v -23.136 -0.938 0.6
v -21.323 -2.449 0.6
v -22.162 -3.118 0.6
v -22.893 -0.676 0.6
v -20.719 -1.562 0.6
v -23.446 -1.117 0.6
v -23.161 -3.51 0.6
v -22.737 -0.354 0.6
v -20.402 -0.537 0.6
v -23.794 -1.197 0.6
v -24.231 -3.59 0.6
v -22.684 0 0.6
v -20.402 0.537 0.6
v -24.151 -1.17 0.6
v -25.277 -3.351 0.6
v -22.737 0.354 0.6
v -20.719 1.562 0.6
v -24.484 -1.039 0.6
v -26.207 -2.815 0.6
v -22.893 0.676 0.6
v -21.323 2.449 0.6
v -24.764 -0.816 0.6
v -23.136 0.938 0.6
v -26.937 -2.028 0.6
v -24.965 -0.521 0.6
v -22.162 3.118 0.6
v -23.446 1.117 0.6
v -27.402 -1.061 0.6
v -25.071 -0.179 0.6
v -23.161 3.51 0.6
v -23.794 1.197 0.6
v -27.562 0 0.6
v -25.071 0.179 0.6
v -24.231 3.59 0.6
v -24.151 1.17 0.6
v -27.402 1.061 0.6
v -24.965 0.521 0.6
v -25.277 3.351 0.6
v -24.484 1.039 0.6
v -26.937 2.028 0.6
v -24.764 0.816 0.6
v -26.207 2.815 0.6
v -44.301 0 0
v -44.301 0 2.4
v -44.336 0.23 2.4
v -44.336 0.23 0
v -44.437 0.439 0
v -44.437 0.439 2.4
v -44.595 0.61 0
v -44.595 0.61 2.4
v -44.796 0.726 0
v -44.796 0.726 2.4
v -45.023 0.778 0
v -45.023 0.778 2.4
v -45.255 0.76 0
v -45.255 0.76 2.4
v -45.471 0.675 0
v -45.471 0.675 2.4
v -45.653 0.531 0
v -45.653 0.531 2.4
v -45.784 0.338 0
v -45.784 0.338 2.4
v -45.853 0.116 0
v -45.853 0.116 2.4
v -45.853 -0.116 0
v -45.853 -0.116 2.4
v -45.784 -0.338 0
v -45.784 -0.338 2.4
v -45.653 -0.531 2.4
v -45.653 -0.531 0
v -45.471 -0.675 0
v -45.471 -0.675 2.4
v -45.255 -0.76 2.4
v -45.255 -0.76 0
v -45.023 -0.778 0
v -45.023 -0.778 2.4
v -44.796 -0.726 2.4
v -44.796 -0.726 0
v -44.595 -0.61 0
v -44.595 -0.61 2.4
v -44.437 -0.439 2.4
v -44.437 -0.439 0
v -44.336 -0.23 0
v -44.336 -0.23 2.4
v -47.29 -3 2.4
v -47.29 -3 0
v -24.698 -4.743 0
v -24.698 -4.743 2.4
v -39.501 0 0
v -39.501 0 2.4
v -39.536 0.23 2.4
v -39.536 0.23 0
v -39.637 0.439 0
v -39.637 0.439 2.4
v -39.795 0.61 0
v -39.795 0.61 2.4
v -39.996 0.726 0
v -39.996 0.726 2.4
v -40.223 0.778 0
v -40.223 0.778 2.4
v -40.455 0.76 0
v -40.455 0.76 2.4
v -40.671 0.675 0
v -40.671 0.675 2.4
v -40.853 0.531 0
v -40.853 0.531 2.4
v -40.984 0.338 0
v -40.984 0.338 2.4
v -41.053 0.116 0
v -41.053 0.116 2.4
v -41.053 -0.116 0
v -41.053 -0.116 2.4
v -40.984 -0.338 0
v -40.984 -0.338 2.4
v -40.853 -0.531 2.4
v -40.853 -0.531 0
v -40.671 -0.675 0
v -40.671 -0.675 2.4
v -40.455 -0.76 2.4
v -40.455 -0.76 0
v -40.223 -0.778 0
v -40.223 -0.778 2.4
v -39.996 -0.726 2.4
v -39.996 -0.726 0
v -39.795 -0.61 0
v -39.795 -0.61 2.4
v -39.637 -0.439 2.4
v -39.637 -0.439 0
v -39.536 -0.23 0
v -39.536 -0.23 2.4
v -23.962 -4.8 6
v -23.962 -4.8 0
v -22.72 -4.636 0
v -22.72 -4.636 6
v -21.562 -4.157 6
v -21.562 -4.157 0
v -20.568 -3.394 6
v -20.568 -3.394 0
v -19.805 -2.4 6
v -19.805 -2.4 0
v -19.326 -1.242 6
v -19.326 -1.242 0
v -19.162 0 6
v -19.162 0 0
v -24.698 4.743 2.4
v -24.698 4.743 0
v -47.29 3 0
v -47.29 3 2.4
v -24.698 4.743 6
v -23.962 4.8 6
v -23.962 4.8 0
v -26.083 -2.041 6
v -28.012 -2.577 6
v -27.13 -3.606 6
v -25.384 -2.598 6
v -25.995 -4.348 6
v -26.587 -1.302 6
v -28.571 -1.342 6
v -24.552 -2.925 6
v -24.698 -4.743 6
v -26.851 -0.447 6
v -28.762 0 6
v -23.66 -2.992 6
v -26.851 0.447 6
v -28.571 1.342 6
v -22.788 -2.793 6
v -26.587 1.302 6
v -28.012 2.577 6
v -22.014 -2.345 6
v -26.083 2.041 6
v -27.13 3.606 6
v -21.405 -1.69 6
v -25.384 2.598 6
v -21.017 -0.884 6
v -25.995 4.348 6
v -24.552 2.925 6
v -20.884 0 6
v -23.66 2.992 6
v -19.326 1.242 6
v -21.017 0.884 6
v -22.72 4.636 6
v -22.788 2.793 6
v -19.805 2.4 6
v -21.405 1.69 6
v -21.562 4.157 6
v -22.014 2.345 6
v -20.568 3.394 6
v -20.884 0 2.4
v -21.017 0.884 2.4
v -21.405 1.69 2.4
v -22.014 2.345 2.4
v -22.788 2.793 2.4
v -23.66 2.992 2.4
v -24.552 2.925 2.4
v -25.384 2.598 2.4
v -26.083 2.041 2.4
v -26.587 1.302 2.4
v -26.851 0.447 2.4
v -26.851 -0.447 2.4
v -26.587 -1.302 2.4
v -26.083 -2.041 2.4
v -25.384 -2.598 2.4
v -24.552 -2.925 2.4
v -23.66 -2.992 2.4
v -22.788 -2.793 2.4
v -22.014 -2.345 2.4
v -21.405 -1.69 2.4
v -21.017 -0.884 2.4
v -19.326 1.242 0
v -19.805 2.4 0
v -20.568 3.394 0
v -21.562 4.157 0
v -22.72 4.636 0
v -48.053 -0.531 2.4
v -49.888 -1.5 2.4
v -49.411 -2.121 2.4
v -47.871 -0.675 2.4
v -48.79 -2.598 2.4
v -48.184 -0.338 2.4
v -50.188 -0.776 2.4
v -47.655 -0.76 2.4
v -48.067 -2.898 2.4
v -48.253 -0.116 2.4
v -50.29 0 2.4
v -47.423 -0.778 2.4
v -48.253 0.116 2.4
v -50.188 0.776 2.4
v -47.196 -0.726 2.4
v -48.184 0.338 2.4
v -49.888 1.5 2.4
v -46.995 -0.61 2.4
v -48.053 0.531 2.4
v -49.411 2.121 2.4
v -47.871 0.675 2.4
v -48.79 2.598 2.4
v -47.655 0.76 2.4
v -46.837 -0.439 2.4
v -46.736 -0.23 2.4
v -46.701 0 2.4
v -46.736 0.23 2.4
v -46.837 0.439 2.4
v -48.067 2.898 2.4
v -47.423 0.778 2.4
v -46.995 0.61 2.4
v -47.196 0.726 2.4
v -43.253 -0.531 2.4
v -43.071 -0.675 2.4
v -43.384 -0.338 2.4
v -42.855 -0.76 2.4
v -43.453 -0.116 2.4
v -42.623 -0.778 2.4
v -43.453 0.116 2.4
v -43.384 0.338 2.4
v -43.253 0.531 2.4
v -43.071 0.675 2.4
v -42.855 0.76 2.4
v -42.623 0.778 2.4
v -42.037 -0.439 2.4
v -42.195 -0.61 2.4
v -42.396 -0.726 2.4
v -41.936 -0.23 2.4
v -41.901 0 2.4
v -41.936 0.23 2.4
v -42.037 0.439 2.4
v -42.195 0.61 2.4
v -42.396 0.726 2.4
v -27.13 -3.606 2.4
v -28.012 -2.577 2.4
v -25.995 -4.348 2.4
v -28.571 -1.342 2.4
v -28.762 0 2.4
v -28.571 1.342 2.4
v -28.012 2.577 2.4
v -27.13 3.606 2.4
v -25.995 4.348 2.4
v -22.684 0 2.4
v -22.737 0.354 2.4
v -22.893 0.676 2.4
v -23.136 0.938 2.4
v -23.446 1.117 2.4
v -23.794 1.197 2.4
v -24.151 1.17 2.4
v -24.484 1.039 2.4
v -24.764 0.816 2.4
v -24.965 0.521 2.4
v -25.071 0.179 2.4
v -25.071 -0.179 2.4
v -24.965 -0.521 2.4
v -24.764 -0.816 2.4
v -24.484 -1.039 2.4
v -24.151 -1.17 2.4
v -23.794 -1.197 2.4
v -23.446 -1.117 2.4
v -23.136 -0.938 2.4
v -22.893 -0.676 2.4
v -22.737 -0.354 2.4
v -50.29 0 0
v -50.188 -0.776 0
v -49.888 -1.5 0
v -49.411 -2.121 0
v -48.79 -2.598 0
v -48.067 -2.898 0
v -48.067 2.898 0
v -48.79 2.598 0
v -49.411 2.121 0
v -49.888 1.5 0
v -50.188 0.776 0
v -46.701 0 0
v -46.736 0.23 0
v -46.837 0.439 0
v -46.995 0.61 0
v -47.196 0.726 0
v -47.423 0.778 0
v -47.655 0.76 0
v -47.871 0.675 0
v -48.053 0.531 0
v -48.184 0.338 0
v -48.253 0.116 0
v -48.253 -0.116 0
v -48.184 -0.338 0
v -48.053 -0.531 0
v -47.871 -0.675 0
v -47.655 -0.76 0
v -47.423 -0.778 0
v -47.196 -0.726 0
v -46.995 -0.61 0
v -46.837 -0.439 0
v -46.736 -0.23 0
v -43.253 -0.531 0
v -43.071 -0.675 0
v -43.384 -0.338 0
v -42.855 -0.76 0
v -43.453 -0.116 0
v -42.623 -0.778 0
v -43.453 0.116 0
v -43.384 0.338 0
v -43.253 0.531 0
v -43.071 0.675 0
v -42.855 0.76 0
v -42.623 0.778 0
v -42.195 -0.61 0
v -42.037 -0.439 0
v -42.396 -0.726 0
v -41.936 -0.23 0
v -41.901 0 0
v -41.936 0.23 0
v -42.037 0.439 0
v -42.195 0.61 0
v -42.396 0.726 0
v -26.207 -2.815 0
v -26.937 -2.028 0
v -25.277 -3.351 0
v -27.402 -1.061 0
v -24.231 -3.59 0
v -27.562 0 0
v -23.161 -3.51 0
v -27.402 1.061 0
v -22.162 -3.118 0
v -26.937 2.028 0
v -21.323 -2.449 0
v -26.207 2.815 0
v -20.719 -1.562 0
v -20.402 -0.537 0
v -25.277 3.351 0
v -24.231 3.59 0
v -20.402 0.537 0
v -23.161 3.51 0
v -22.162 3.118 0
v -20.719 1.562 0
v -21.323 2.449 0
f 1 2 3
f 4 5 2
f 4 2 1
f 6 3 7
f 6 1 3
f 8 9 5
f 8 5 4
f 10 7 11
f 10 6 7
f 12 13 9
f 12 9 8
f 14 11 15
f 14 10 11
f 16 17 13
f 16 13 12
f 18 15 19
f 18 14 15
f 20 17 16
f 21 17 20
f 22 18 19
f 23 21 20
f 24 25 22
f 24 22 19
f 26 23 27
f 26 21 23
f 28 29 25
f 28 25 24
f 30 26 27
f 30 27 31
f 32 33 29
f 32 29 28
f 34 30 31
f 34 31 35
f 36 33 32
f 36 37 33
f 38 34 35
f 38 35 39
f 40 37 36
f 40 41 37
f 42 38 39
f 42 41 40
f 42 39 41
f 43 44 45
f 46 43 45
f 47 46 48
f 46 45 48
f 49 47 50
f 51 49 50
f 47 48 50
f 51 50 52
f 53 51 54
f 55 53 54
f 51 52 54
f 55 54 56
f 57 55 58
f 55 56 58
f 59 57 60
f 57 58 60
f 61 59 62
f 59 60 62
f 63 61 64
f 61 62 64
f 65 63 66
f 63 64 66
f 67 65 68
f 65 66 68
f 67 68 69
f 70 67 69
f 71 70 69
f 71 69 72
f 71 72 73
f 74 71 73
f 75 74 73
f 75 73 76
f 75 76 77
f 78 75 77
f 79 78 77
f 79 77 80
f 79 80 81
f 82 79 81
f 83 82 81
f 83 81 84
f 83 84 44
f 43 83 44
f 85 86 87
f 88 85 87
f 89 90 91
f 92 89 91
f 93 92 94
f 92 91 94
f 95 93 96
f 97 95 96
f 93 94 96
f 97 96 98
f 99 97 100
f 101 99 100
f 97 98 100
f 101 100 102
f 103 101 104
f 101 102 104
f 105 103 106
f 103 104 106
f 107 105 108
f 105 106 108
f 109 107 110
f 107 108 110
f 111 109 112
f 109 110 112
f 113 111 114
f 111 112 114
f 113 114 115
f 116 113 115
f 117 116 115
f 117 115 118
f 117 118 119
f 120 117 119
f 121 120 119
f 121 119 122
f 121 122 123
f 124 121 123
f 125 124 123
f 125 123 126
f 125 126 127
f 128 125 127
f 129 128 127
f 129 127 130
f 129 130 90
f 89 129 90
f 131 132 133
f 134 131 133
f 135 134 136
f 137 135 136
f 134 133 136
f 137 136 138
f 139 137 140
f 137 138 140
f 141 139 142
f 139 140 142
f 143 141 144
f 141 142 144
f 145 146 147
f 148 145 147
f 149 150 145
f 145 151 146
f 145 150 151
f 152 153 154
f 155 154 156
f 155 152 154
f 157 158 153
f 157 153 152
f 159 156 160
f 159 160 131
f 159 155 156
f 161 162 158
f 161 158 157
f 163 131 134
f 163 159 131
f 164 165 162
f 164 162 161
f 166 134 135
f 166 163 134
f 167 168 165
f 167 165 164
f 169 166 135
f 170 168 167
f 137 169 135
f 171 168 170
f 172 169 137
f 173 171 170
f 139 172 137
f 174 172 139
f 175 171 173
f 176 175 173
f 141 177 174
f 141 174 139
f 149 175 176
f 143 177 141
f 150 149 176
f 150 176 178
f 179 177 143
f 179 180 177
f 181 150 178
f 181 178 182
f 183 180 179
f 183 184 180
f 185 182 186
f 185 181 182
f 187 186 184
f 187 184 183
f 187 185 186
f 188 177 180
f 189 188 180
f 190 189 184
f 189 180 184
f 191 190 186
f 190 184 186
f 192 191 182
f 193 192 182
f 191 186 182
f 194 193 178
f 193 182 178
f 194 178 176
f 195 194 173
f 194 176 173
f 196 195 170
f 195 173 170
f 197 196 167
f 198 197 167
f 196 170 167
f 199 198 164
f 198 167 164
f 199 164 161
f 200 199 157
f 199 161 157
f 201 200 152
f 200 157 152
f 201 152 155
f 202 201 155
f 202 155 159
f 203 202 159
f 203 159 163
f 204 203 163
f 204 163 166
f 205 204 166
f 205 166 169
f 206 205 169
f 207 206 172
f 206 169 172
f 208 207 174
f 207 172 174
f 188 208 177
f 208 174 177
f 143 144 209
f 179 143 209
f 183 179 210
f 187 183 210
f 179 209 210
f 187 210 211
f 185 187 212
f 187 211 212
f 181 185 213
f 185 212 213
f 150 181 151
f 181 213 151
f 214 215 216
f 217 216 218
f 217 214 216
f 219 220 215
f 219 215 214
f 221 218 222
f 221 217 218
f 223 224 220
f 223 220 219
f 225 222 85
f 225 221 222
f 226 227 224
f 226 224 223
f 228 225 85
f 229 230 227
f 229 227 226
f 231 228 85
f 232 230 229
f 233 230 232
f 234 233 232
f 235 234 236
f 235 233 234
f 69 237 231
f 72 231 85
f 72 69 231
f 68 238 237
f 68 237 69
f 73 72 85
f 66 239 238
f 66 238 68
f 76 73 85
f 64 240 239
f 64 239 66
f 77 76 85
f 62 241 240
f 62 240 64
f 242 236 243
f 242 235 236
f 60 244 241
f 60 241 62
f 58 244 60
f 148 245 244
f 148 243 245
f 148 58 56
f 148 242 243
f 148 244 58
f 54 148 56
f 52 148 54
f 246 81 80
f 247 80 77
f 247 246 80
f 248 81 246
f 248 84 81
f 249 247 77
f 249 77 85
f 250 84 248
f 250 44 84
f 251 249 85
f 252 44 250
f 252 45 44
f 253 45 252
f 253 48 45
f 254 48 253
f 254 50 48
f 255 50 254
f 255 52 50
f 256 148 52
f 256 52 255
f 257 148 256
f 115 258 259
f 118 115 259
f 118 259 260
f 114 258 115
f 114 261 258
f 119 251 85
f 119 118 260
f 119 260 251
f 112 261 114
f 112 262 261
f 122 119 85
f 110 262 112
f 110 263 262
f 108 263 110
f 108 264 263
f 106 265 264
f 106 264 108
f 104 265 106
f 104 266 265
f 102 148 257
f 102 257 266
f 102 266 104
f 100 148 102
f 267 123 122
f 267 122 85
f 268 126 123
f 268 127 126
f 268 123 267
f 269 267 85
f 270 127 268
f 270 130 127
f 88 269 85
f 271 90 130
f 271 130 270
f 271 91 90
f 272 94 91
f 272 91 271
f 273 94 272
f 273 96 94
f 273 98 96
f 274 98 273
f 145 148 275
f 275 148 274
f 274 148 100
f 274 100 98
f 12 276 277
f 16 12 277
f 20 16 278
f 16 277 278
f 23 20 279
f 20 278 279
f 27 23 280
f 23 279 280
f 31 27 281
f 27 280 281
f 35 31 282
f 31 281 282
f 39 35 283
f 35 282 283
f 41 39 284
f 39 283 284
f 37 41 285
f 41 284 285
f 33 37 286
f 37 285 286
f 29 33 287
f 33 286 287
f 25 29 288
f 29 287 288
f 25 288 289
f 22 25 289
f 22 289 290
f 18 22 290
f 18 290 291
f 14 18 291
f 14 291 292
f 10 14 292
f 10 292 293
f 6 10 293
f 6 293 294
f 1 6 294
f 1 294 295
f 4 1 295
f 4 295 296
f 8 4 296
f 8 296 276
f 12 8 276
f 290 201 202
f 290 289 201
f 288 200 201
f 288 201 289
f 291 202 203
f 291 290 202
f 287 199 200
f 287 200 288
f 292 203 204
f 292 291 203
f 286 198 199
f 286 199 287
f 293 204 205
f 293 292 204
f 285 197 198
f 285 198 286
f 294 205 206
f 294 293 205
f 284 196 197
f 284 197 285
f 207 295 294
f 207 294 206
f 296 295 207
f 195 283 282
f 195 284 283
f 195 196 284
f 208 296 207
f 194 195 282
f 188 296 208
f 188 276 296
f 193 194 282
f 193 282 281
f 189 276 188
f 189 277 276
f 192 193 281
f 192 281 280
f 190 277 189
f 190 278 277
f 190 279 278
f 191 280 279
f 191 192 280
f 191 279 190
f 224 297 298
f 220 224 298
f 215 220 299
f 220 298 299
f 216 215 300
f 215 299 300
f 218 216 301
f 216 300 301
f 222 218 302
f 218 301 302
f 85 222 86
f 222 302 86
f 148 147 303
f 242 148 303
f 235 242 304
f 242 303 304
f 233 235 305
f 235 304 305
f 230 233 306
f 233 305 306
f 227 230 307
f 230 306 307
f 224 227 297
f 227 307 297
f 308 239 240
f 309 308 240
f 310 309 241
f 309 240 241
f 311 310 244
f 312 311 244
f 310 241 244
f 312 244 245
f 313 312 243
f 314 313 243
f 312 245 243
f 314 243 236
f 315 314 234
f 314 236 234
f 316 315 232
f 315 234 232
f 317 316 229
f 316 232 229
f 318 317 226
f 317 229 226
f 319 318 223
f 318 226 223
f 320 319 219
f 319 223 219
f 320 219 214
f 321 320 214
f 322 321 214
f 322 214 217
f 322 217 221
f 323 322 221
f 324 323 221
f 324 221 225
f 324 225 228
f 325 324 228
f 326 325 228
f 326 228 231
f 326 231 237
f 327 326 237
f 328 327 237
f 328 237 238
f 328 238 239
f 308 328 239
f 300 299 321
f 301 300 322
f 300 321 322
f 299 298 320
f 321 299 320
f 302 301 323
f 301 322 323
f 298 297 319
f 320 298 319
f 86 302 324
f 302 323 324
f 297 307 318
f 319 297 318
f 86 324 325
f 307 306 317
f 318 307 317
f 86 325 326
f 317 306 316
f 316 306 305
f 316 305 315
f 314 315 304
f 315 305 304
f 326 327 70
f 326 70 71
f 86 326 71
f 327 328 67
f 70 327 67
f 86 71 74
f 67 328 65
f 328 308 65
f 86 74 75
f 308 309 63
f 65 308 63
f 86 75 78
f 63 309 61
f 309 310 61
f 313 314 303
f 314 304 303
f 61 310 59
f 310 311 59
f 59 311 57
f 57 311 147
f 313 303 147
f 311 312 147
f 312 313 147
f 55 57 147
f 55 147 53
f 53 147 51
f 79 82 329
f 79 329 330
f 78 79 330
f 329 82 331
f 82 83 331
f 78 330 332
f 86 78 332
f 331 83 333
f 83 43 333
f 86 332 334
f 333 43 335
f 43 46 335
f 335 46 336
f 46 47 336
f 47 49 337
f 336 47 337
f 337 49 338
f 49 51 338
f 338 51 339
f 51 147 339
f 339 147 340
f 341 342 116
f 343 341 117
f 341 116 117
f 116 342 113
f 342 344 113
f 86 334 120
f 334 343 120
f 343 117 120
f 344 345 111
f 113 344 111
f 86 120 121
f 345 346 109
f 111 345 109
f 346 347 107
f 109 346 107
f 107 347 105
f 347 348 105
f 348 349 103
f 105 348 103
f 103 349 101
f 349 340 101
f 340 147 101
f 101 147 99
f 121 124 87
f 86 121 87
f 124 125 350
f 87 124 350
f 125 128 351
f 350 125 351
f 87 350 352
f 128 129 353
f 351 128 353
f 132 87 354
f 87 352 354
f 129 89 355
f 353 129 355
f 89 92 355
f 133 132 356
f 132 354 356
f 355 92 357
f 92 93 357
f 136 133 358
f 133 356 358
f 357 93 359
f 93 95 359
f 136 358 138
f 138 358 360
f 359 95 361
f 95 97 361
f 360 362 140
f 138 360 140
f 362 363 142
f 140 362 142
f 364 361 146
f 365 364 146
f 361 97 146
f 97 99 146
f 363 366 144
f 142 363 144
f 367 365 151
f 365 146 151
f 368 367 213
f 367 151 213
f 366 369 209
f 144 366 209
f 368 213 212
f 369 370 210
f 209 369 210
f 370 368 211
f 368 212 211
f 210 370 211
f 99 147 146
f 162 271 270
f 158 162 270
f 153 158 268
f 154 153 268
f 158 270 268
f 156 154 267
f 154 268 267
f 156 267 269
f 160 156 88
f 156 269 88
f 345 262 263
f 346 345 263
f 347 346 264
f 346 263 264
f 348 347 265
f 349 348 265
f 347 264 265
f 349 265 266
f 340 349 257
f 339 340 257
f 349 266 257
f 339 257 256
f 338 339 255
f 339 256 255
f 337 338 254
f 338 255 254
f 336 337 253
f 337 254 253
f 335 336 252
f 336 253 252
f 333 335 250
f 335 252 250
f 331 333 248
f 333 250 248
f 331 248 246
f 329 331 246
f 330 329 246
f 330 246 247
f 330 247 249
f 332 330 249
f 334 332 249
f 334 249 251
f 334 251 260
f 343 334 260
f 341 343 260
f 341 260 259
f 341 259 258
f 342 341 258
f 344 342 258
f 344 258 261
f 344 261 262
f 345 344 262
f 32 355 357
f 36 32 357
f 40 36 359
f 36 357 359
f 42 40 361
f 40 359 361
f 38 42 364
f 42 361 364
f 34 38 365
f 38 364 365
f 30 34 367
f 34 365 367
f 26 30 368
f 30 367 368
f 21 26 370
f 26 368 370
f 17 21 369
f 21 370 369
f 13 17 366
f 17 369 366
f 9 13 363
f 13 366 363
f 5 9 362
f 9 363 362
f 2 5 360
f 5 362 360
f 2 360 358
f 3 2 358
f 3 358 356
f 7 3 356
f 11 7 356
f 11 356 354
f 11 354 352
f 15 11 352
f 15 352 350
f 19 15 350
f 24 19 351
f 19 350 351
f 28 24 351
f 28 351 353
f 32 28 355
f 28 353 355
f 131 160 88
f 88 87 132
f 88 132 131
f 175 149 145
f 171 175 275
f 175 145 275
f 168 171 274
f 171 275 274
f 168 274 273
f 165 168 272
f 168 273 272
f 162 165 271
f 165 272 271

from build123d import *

# Parameters (mm, degrees)
BOSS_EXTRU_1_DEPTH      = 2.4
BOSS_EXTRU_2_DEPTH      = 6
ESQUISSE2_R             = 0.78
ENL_V_MAT_EXTRU_1_DEPTH = 51.646782553
ESQUISSE3_R             = 3.6
ENL_V_MAT_EXTRU_2_DEPTH = 0.6
ESQUISSE4_R             = 3
ENL_V_MAT_EXTRU_3_DEPTH = 3.6
ESQUISSE5_R             = 1.2
ENL_V_MAT_EXTRU_4_DEPTH = 3.6


with BuildPart() as part:
    # Esquisse1 → Boss.-Extru.1 (new body)
    with BuildSketch(Plane.XY):
        with BuildLine():
            ThreePointArc((-24.698480773, -4.743182356), (-28.762124109, 0), (-24.698480773, 4.743182356))
            Line((-24.698480773, 4.743182356), (-47.290124109, 3))
            ThreePointArc((-47.290124109, 3), (-50.290124109, 0), (-47.290124109, -3))
            Line((-47.290124109, -3), (-24.698480773, -4.743182356))
        make_face()
    extrude(amount=BOSS_EXTRU_1_DEPTH)

    # Esquisse1<3> → Boss.-Extru.2 (add)
    with BuildSketch(Plane.XY):
        with BuildLine():
            ThreePointArc((-23.962124109, -4.8), (-19.162124109, 0), (-23.962124109, 4.8))
            Line((-23.962124109, 4.8), (-24.698480773, 4.743182356))
            ThreePointArc((-24.698480773, 4.743182356), (-28.762124109, 0), (-24.698480773, -4.743182356))
            Line((-24.698480773, -4.743182356), (-23.962124109, -4.8))
        make_face()
    extrude(amount=BOSS_EXTRU_2_DEPTH)

    # Esquisse2 → Enlèv. mat.-Extru.1 (cut, through all)
    with BuildSketch(Plane.XY.offset(2.4)):
        with Locations((-47.481401961, 0)):
            Circle(ESQUISSE2_R)
        with Locations((-45.081401961, 0)):
            Circle(ESQUISSE2_R)
        with Locations((-42.681401961, 0)):
            Circle(ESQUISSE2_R)
        with Locations((-40.281401961, 0)):
            Circle(ESQUISSE2_R)
    extrude(amount=-ENL_V_MAT_EXTRU_1_DEPTH, mode=Mode.SUBTRACT)

    # Esquisse3 → Enlèv. mat.-Extru.2 (cut)
    with BuildSketch(Plane(origin=(0, 0, 0), x_dir=(-1, 0, 0), z_dir=(0, 0, -1))):
        with Locations((23.962124109, 0)):
            Circle(ESQUISSE3_R)
    extrude(amount=-ENL_V_MAT_EXTRU_2_DEPTH, mode=Mode.SUBTRACT)

    # Esquisse4 → Enlèv. mat.-Extru.3 (cut)
    with BuildSketch(Plane.XY.offset(6)):
        with Locations((-23.884137935, 0)):
            Circle(ESQUISSE4_R)
    extrude(amount=-ENL_V_MAT_EXTRU_3_DEPTH, mode=Mode.SUBTRACT)

    # Esquisse5 → Enlèv. mat.-Extru.4 (cut)
    with BuildSketch(Plane.XY.offset(2.4)):
        with Locations((-23.884137935, 0)):
            Circle(ESQUISSE5_R)
    extrude(amount=-ENL_V_MAT_EXTRU_4_DEPTH, mode=Mode.SUBTRACT)


solid = part.part
